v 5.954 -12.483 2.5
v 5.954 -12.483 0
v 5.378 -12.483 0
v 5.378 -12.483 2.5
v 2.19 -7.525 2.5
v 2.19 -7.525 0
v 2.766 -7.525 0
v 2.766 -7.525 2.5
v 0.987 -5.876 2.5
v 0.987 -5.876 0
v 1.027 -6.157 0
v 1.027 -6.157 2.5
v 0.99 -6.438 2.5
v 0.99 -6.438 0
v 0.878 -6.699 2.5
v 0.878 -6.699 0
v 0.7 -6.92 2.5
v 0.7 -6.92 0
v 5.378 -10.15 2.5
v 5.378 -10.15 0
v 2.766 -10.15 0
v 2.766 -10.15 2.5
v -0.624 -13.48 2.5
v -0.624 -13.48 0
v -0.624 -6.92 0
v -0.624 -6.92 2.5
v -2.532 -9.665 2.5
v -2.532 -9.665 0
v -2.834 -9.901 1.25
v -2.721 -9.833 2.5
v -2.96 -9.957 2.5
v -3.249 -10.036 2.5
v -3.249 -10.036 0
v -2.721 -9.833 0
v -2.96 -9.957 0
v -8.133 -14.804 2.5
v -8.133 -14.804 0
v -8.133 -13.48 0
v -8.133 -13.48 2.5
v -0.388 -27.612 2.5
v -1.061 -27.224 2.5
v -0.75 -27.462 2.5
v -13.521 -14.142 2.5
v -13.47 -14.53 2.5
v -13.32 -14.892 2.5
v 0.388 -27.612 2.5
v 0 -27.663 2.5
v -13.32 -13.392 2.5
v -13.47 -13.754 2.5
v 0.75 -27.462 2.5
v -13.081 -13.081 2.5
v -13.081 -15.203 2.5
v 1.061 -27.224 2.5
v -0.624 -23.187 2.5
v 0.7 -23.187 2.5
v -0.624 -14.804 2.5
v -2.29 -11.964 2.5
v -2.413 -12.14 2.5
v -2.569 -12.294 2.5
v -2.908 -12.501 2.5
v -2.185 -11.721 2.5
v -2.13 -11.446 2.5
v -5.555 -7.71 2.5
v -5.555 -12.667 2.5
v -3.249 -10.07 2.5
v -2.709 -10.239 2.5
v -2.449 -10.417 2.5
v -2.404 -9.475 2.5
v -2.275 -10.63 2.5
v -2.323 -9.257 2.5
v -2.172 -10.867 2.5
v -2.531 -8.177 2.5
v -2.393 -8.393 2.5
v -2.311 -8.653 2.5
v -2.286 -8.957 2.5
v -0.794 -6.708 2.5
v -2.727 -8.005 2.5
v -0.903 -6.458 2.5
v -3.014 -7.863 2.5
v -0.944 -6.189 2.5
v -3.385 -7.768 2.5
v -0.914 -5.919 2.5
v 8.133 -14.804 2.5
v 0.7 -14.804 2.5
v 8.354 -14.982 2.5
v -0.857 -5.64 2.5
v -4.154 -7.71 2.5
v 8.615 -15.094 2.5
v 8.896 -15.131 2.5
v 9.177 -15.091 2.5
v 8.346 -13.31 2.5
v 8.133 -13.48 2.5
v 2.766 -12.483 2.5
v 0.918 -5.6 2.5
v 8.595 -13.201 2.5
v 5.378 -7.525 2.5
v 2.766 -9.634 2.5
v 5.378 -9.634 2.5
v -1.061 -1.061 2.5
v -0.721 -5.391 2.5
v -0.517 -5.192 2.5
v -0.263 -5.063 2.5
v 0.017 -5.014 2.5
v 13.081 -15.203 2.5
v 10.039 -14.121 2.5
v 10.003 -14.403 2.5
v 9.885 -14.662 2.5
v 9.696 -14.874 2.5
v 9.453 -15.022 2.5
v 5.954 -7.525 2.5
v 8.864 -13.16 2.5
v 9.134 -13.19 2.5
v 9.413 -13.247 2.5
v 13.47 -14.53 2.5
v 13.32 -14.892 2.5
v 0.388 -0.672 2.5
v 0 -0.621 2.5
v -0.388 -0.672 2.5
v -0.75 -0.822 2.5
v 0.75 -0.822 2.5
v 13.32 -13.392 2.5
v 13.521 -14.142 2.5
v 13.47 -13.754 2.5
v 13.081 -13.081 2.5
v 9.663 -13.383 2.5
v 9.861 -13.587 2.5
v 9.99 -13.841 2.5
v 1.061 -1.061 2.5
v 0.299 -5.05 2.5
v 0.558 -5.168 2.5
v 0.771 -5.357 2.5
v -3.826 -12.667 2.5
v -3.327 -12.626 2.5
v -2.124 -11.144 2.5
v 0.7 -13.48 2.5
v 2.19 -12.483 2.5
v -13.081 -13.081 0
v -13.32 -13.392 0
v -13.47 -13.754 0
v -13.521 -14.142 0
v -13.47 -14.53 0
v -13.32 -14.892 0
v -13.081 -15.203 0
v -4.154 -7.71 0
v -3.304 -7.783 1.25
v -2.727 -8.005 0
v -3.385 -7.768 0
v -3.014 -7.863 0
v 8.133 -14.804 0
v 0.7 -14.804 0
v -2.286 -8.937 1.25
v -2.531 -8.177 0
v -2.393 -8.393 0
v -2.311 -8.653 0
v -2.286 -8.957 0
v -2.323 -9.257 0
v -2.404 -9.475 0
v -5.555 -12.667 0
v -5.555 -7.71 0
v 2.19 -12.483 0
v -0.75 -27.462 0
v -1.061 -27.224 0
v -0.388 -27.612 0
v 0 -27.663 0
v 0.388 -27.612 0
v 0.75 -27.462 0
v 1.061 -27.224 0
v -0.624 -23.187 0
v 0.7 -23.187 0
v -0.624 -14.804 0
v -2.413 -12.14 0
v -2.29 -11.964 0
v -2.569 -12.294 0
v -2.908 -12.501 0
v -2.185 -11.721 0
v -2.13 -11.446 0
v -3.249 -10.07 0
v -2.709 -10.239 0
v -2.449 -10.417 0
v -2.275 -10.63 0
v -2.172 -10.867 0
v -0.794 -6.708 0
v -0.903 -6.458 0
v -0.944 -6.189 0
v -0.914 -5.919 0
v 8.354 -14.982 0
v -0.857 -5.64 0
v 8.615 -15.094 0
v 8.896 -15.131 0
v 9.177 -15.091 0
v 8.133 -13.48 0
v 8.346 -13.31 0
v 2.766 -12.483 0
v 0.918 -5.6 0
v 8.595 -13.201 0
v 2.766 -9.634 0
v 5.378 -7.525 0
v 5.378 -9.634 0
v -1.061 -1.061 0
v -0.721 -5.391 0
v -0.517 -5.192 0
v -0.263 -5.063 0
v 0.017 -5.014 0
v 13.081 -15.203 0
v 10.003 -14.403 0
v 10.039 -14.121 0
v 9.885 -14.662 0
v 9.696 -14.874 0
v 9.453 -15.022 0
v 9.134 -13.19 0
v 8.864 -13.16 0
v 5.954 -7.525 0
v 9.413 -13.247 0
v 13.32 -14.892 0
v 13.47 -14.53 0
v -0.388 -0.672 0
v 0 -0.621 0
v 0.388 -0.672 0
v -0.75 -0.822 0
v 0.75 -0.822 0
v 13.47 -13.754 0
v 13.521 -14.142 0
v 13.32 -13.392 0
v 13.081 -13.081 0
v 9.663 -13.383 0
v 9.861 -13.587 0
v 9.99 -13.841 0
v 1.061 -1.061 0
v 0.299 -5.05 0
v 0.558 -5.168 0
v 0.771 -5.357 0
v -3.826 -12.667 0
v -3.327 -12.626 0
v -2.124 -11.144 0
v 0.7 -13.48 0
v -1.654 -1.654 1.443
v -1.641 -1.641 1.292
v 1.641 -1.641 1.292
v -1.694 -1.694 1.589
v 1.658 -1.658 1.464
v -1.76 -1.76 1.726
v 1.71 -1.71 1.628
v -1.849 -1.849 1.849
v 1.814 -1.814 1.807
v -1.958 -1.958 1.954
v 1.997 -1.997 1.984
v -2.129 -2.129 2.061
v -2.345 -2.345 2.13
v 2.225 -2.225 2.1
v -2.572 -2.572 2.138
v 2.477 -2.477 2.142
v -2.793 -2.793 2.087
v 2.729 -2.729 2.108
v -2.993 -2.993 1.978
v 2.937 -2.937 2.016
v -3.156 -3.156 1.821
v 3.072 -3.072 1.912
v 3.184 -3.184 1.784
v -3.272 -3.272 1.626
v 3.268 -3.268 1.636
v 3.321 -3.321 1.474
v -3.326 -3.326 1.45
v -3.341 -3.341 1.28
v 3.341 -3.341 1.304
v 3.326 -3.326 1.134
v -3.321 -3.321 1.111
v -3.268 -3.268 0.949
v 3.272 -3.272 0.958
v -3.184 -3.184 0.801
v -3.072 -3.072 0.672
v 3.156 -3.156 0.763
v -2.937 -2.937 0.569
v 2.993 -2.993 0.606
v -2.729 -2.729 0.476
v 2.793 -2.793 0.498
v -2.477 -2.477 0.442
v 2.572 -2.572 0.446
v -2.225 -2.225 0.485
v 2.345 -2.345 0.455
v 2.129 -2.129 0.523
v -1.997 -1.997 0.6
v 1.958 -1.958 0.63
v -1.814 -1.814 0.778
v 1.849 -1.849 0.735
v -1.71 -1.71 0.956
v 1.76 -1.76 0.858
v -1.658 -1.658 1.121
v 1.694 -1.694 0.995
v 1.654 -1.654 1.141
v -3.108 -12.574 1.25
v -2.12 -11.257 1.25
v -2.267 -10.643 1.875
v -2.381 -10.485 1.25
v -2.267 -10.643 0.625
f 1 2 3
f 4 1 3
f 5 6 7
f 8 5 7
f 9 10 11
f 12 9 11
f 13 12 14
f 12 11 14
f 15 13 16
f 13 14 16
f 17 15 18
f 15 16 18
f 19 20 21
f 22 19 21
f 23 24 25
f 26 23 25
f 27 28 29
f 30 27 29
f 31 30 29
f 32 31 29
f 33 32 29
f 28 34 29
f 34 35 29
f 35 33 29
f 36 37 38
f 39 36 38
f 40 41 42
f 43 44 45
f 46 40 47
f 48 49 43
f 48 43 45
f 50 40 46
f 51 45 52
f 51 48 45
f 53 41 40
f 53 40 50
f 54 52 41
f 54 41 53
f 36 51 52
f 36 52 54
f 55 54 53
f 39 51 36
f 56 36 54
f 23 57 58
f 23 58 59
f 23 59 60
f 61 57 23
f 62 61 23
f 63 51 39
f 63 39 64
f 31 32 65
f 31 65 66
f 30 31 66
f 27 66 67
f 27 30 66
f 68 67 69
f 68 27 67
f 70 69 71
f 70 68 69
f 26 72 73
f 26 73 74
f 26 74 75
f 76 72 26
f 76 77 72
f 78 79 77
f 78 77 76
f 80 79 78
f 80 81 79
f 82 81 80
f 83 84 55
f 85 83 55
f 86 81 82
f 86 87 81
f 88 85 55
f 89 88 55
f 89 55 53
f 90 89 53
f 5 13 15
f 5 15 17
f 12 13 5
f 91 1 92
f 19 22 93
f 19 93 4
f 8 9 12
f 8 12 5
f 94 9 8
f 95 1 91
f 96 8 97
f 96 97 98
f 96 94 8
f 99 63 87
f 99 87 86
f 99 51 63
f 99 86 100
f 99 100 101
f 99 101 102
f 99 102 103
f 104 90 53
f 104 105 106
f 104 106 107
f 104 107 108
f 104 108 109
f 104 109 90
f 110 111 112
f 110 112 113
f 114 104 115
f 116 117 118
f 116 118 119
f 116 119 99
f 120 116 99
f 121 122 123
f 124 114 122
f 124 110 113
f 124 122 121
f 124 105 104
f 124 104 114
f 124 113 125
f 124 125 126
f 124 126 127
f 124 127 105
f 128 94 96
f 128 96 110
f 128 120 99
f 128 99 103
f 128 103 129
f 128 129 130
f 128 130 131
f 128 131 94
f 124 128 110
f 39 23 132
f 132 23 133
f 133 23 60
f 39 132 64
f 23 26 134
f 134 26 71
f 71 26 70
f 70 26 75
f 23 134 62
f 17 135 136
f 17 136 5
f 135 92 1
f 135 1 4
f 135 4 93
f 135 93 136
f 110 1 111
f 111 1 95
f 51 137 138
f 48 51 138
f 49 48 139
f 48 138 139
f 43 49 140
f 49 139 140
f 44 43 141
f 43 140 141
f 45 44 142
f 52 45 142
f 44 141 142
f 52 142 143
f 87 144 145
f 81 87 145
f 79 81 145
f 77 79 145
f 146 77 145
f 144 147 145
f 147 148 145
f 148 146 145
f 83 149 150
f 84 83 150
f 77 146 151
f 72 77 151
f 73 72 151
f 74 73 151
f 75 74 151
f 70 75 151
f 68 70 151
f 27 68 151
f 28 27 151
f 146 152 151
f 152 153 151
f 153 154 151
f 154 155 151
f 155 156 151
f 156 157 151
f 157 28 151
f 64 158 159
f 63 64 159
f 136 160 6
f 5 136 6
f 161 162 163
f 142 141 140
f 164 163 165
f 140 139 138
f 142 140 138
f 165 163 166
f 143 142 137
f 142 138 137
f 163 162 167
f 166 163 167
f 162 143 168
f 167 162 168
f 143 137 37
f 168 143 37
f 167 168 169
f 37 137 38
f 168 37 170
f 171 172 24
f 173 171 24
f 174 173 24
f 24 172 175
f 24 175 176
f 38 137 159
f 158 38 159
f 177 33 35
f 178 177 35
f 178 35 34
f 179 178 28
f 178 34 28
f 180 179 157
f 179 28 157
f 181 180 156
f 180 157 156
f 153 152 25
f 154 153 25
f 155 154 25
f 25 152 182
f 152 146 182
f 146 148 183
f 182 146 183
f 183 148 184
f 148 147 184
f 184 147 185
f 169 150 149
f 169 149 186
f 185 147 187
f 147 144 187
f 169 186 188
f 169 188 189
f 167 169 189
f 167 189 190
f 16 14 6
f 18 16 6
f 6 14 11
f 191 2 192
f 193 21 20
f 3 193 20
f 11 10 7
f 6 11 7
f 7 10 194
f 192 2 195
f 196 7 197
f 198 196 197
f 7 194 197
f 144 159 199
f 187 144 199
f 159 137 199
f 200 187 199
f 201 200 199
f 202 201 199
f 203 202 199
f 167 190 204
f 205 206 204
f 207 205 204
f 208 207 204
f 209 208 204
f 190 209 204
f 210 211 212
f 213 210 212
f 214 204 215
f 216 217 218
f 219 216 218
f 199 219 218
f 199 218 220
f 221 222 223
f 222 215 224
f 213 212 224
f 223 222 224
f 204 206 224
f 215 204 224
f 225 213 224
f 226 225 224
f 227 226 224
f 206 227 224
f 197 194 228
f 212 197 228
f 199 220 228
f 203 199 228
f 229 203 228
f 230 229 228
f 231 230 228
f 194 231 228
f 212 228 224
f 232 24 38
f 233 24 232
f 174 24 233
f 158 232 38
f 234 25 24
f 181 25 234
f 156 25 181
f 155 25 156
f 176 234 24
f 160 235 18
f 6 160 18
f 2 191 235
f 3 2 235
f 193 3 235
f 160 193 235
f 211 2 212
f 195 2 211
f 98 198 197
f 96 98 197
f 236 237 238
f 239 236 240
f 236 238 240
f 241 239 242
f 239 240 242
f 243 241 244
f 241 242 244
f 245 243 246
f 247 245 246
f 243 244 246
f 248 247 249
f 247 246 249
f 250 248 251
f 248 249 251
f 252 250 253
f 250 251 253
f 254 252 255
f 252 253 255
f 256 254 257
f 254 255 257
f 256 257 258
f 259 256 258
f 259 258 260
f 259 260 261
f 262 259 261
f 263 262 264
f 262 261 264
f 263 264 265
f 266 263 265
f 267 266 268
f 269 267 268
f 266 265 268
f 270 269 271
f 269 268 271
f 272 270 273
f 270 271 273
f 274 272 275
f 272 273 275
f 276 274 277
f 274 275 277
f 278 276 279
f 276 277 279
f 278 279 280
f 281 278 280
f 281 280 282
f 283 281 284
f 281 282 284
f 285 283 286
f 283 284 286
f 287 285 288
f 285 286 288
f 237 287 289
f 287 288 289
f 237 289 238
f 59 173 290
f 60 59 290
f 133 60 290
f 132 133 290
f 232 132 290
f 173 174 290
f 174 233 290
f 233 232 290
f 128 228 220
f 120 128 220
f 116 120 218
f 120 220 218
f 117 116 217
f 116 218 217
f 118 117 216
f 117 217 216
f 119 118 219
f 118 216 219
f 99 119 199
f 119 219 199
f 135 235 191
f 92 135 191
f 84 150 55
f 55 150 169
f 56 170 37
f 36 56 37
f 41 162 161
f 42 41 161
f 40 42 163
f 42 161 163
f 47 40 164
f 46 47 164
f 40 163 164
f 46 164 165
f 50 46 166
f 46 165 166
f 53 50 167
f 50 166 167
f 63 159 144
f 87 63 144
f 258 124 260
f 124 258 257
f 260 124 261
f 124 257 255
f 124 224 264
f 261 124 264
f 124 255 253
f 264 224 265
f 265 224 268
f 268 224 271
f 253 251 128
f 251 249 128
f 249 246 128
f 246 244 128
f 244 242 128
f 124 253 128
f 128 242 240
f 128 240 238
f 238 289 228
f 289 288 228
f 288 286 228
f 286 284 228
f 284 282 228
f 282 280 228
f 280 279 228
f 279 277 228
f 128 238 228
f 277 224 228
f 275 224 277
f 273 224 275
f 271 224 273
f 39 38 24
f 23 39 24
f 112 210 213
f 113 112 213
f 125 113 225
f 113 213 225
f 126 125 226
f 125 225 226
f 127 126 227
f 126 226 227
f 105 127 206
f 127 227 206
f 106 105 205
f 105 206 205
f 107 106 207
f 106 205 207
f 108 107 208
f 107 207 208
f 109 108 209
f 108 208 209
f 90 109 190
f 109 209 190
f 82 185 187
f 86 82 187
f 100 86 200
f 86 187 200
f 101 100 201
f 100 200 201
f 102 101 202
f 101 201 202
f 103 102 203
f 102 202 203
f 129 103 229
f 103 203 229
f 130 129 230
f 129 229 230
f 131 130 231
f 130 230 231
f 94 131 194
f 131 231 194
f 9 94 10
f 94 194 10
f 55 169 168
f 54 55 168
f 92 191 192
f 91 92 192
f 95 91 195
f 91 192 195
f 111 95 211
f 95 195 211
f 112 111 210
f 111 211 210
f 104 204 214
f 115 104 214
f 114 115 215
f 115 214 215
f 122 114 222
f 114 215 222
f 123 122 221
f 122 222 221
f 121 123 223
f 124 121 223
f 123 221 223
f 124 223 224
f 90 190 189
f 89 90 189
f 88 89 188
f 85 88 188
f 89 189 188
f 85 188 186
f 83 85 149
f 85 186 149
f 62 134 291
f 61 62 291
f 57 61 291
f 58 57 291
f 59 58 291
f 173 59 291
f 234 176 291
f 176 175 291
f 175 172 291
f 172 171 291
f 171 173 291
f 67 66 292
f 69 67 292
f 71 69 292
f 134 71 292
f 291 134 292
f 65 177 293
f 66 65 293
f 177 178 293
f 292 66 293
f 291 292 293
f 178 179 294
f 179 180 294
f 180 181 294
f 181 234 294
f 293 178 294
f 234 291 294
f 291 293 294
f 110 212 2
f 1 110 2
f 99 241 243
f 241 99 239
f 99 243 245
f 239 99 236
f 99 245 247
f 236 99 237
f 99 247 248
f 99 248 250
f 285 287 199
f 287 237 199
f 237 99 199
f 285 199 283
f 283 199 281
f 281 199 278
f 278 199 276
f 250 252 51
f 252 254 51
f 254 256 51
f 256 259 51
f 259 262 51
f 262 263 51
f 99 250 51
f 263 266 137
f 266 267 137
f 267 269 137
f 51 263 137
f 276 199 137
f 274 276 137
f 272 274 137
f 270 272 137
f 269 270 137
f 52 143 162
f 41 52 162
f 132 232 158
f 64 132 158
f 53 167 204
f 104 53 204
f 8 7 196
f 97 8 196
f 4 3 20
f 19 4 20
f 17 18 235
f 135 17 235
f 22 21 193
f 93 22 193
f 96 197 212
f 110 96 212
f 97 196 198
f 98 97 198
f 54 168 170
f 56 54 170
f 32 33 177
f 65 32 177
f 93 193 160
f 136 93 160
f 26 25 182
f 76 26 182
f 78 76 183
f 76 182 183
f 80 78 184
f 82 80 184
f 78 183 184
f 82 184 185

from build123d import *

# Parameters (mm, degrees)
F1_DEPTH = 2.5
F2_R     = 0.85
F3_DEPTH = 12.5


with BuildPart() as f1:
    # F0 (on Top) → F1 (new body)
    with BuildSketch(Plane.XY):
        with BuildLine():
            Line((13.081475452, -13.081475452), (1.0606601718, -1.0606601718))
            ThreePointArc((1.0606601718, -1.0606601718), (0, -0.6213203436), (-1.0606601718, -1.0606601718))
            Line((-1.0606601718, -1.0606601718), (-13.081475452, -13.081475452))
            ThreePointArc((-13.081475452, -13.081475452), (-13.5208152802, -14.1421356237), (-13.081475452, -15.2027957955))
            Line((-13.081475452, -15.2027957955), (-1.0606601718, -27.2236110757))
            ThreePointArc((-1.0606601718, -27.2236110757), (0, -27.6629509039), (1.0606601718, -27.2236110757))
            Line((1.0606601718, -27.2236110757), (13.081475452, -15.2027957955))
            ThreePointArc((13.081475452, -15.2027957955), (13.5208152802, -14.1421356237), (13.081475452, -13.081475452))
        make_face()
        with BuildLine():
            Line((-5.5551142142, -12.6671945862), (-5.5551142142, -7.7095122946))
            Line((-5.5551142142, -7.7095122946), (-4.1542895614, -7.7095122946))
            add(Edge.make_bspline(
                [(-4.1542895614, -7.7095122946), (-3.1679614364, -7.7095122946), (-2.7268807073, -8.0046511835)],
                knots=[0, 0, 0, 1, 1, 1], degree=2))
            add(Edge.make_bspline(
                [(-2.7268807073, -8.0046511835), (-2.2857999781, -8.2997900724), (-2.2857999781, -8.9367258362)],
                knots=[0, 0, 0, 1, 1, 1], degree=2))
            add(Edge.make_bspline(
                [(-2.2857999781, -8.9367258362), (-2.2857999781, -9.3783491001), (-2.5315682073, -9.6648074335)],
                knots=[0, 0, 0, 1, 1, 1], degree=2))
            add(Edge.make_bspline(
                [(-2.5315682073, -9.6648074335), (-2.7773364364, -9.9512657668), (-3.2493416448, -10.0359011835)],
                knots=[0, 0, 0, 1, 1, 1], degree=2))
            Line((-3.2493416448, -10.0359011835), (-3.2493416448, -10.0695383362))
            add(Edge.make_bspline(
                [(-3.2493416448, -10.0695383362), (-2.1197843531, -10.2626806974), (-2.1197843531, -11.2566043085)],
                knots=[0, 0, 0, 1, 1, 1], degree=2))
            add(Edge.make_bspline(
                [(-2.1197843531, -11.2566043085), (-2.1197843531, -11.9206668085), (-2.5690031031, -12.2939306974)],
                knots=[0, 0, 0, 1, 1, 1], degree=2))
            add(Edge.make_bspline(
                [(-2.5690031031, -12.2939306974), (-3.0182218531, -12.6671945862), (-3.8255135198, -12.6671945862)],
                knots=[0, 0, 0, 1, 1, 1], degree=2))
            Line((-3.8255135198, -12.6671945862), (-5.5551142142, -12.6671945862))
        make_face(mode=Mode.SUBTRACT)
        with BuildLine():
            Line((-8.1334756687, -14.8039748892), (-8.1334756687, -13.4802963582))
            Line((-8.1334756687, -13.4802963582), (-0.6236797201, -13.4802963582))
            Line((-0.6236797201, -13.4802963582), (-0.6236797201, -6.9198086858))
            ThreePointArc((-0.6236797201, -6.9198086858), (-0.9032194318, -6.4583786209), (-0.9135835525, -5.9189782686))
            ThreePointArc((-0.9135835525, -5.9189782686), (0.0168397474, -5.0141534426), (0.9868078824, -5.876451129))
            ThreePointArc((0.9868078824, -5.876451129), (0.9900106564, -6.4384308628), (0.6999988109, -6.9198086858))
            Line((0.6999988109, -6.9198086858), (0.6999988109, -13.4802963582))
            Line((0.6999988109, -13.4802963582), (8.1334756687, -13.4802963582))
            ThreePointArc((8.1334756687, -13.4802963582), (8.5949057336, -13.2007566465), (9.134306086, -13.1903925258))
            ThreePointArc((9.134306086, -13.1903925258), (10.0391309119, -14.1208158258), (9.1768332255, -15.0907839607))
            ThreePointArc((9.1768332255, -15.0907839607), (8.6148534917, -15.0939867347), (8.1334756687, -14.8039748892))
            Line((8.1334756687, -14.8039748892), (0.6999988109, -14.8039748892))
            Line((0.6999988109, -14.8039748892), (0.6999988109, -23.1867600232))
            Line((0.6999988109, -23.1867600232), (-0.6236797201, -23.1867600232))
            Line((-0.6236797201, -23.1867600232), (-0.6236797201, -14.8039748892))
            Line((-0.6236797201, -14.8039748892), (-8.1334756687, -14.8039748892))
        make_face(mode=Mode.SUBTRACT)
        Polygon((5.9541938537, -7.5251016937), (5.9541938537, -12.4827839853), (5.3780219787, -12.4827839853), (5.3780219787, -10.1498846798), (2.7662598259, -10.1498846798), (2.7662598259, -12.4827839853), (2.1900879509, -12.4827839853), (2.1900879509, -7.5251016937), (2.7662598259, -7.5251016937), (2.7662598259, -9.6344766937), (5.3780219787, -9.6344766937), (5.3780219787, -7.5251016937), align=None, mode=Mode.SUBTRACT)
    extrude(amount=F1_DEPTH)

    # F2 (on Right) → F3 (cut, symmetric)
    with BuildSketch(Plane.YZ):
        with Locations((-2.4908210296, 1.292226194)):
            Circle(F2_R)
    extrude(amount=F3_DEPTH, both=True, mode=Mode.SUBTRACT)


solid = f1.part
